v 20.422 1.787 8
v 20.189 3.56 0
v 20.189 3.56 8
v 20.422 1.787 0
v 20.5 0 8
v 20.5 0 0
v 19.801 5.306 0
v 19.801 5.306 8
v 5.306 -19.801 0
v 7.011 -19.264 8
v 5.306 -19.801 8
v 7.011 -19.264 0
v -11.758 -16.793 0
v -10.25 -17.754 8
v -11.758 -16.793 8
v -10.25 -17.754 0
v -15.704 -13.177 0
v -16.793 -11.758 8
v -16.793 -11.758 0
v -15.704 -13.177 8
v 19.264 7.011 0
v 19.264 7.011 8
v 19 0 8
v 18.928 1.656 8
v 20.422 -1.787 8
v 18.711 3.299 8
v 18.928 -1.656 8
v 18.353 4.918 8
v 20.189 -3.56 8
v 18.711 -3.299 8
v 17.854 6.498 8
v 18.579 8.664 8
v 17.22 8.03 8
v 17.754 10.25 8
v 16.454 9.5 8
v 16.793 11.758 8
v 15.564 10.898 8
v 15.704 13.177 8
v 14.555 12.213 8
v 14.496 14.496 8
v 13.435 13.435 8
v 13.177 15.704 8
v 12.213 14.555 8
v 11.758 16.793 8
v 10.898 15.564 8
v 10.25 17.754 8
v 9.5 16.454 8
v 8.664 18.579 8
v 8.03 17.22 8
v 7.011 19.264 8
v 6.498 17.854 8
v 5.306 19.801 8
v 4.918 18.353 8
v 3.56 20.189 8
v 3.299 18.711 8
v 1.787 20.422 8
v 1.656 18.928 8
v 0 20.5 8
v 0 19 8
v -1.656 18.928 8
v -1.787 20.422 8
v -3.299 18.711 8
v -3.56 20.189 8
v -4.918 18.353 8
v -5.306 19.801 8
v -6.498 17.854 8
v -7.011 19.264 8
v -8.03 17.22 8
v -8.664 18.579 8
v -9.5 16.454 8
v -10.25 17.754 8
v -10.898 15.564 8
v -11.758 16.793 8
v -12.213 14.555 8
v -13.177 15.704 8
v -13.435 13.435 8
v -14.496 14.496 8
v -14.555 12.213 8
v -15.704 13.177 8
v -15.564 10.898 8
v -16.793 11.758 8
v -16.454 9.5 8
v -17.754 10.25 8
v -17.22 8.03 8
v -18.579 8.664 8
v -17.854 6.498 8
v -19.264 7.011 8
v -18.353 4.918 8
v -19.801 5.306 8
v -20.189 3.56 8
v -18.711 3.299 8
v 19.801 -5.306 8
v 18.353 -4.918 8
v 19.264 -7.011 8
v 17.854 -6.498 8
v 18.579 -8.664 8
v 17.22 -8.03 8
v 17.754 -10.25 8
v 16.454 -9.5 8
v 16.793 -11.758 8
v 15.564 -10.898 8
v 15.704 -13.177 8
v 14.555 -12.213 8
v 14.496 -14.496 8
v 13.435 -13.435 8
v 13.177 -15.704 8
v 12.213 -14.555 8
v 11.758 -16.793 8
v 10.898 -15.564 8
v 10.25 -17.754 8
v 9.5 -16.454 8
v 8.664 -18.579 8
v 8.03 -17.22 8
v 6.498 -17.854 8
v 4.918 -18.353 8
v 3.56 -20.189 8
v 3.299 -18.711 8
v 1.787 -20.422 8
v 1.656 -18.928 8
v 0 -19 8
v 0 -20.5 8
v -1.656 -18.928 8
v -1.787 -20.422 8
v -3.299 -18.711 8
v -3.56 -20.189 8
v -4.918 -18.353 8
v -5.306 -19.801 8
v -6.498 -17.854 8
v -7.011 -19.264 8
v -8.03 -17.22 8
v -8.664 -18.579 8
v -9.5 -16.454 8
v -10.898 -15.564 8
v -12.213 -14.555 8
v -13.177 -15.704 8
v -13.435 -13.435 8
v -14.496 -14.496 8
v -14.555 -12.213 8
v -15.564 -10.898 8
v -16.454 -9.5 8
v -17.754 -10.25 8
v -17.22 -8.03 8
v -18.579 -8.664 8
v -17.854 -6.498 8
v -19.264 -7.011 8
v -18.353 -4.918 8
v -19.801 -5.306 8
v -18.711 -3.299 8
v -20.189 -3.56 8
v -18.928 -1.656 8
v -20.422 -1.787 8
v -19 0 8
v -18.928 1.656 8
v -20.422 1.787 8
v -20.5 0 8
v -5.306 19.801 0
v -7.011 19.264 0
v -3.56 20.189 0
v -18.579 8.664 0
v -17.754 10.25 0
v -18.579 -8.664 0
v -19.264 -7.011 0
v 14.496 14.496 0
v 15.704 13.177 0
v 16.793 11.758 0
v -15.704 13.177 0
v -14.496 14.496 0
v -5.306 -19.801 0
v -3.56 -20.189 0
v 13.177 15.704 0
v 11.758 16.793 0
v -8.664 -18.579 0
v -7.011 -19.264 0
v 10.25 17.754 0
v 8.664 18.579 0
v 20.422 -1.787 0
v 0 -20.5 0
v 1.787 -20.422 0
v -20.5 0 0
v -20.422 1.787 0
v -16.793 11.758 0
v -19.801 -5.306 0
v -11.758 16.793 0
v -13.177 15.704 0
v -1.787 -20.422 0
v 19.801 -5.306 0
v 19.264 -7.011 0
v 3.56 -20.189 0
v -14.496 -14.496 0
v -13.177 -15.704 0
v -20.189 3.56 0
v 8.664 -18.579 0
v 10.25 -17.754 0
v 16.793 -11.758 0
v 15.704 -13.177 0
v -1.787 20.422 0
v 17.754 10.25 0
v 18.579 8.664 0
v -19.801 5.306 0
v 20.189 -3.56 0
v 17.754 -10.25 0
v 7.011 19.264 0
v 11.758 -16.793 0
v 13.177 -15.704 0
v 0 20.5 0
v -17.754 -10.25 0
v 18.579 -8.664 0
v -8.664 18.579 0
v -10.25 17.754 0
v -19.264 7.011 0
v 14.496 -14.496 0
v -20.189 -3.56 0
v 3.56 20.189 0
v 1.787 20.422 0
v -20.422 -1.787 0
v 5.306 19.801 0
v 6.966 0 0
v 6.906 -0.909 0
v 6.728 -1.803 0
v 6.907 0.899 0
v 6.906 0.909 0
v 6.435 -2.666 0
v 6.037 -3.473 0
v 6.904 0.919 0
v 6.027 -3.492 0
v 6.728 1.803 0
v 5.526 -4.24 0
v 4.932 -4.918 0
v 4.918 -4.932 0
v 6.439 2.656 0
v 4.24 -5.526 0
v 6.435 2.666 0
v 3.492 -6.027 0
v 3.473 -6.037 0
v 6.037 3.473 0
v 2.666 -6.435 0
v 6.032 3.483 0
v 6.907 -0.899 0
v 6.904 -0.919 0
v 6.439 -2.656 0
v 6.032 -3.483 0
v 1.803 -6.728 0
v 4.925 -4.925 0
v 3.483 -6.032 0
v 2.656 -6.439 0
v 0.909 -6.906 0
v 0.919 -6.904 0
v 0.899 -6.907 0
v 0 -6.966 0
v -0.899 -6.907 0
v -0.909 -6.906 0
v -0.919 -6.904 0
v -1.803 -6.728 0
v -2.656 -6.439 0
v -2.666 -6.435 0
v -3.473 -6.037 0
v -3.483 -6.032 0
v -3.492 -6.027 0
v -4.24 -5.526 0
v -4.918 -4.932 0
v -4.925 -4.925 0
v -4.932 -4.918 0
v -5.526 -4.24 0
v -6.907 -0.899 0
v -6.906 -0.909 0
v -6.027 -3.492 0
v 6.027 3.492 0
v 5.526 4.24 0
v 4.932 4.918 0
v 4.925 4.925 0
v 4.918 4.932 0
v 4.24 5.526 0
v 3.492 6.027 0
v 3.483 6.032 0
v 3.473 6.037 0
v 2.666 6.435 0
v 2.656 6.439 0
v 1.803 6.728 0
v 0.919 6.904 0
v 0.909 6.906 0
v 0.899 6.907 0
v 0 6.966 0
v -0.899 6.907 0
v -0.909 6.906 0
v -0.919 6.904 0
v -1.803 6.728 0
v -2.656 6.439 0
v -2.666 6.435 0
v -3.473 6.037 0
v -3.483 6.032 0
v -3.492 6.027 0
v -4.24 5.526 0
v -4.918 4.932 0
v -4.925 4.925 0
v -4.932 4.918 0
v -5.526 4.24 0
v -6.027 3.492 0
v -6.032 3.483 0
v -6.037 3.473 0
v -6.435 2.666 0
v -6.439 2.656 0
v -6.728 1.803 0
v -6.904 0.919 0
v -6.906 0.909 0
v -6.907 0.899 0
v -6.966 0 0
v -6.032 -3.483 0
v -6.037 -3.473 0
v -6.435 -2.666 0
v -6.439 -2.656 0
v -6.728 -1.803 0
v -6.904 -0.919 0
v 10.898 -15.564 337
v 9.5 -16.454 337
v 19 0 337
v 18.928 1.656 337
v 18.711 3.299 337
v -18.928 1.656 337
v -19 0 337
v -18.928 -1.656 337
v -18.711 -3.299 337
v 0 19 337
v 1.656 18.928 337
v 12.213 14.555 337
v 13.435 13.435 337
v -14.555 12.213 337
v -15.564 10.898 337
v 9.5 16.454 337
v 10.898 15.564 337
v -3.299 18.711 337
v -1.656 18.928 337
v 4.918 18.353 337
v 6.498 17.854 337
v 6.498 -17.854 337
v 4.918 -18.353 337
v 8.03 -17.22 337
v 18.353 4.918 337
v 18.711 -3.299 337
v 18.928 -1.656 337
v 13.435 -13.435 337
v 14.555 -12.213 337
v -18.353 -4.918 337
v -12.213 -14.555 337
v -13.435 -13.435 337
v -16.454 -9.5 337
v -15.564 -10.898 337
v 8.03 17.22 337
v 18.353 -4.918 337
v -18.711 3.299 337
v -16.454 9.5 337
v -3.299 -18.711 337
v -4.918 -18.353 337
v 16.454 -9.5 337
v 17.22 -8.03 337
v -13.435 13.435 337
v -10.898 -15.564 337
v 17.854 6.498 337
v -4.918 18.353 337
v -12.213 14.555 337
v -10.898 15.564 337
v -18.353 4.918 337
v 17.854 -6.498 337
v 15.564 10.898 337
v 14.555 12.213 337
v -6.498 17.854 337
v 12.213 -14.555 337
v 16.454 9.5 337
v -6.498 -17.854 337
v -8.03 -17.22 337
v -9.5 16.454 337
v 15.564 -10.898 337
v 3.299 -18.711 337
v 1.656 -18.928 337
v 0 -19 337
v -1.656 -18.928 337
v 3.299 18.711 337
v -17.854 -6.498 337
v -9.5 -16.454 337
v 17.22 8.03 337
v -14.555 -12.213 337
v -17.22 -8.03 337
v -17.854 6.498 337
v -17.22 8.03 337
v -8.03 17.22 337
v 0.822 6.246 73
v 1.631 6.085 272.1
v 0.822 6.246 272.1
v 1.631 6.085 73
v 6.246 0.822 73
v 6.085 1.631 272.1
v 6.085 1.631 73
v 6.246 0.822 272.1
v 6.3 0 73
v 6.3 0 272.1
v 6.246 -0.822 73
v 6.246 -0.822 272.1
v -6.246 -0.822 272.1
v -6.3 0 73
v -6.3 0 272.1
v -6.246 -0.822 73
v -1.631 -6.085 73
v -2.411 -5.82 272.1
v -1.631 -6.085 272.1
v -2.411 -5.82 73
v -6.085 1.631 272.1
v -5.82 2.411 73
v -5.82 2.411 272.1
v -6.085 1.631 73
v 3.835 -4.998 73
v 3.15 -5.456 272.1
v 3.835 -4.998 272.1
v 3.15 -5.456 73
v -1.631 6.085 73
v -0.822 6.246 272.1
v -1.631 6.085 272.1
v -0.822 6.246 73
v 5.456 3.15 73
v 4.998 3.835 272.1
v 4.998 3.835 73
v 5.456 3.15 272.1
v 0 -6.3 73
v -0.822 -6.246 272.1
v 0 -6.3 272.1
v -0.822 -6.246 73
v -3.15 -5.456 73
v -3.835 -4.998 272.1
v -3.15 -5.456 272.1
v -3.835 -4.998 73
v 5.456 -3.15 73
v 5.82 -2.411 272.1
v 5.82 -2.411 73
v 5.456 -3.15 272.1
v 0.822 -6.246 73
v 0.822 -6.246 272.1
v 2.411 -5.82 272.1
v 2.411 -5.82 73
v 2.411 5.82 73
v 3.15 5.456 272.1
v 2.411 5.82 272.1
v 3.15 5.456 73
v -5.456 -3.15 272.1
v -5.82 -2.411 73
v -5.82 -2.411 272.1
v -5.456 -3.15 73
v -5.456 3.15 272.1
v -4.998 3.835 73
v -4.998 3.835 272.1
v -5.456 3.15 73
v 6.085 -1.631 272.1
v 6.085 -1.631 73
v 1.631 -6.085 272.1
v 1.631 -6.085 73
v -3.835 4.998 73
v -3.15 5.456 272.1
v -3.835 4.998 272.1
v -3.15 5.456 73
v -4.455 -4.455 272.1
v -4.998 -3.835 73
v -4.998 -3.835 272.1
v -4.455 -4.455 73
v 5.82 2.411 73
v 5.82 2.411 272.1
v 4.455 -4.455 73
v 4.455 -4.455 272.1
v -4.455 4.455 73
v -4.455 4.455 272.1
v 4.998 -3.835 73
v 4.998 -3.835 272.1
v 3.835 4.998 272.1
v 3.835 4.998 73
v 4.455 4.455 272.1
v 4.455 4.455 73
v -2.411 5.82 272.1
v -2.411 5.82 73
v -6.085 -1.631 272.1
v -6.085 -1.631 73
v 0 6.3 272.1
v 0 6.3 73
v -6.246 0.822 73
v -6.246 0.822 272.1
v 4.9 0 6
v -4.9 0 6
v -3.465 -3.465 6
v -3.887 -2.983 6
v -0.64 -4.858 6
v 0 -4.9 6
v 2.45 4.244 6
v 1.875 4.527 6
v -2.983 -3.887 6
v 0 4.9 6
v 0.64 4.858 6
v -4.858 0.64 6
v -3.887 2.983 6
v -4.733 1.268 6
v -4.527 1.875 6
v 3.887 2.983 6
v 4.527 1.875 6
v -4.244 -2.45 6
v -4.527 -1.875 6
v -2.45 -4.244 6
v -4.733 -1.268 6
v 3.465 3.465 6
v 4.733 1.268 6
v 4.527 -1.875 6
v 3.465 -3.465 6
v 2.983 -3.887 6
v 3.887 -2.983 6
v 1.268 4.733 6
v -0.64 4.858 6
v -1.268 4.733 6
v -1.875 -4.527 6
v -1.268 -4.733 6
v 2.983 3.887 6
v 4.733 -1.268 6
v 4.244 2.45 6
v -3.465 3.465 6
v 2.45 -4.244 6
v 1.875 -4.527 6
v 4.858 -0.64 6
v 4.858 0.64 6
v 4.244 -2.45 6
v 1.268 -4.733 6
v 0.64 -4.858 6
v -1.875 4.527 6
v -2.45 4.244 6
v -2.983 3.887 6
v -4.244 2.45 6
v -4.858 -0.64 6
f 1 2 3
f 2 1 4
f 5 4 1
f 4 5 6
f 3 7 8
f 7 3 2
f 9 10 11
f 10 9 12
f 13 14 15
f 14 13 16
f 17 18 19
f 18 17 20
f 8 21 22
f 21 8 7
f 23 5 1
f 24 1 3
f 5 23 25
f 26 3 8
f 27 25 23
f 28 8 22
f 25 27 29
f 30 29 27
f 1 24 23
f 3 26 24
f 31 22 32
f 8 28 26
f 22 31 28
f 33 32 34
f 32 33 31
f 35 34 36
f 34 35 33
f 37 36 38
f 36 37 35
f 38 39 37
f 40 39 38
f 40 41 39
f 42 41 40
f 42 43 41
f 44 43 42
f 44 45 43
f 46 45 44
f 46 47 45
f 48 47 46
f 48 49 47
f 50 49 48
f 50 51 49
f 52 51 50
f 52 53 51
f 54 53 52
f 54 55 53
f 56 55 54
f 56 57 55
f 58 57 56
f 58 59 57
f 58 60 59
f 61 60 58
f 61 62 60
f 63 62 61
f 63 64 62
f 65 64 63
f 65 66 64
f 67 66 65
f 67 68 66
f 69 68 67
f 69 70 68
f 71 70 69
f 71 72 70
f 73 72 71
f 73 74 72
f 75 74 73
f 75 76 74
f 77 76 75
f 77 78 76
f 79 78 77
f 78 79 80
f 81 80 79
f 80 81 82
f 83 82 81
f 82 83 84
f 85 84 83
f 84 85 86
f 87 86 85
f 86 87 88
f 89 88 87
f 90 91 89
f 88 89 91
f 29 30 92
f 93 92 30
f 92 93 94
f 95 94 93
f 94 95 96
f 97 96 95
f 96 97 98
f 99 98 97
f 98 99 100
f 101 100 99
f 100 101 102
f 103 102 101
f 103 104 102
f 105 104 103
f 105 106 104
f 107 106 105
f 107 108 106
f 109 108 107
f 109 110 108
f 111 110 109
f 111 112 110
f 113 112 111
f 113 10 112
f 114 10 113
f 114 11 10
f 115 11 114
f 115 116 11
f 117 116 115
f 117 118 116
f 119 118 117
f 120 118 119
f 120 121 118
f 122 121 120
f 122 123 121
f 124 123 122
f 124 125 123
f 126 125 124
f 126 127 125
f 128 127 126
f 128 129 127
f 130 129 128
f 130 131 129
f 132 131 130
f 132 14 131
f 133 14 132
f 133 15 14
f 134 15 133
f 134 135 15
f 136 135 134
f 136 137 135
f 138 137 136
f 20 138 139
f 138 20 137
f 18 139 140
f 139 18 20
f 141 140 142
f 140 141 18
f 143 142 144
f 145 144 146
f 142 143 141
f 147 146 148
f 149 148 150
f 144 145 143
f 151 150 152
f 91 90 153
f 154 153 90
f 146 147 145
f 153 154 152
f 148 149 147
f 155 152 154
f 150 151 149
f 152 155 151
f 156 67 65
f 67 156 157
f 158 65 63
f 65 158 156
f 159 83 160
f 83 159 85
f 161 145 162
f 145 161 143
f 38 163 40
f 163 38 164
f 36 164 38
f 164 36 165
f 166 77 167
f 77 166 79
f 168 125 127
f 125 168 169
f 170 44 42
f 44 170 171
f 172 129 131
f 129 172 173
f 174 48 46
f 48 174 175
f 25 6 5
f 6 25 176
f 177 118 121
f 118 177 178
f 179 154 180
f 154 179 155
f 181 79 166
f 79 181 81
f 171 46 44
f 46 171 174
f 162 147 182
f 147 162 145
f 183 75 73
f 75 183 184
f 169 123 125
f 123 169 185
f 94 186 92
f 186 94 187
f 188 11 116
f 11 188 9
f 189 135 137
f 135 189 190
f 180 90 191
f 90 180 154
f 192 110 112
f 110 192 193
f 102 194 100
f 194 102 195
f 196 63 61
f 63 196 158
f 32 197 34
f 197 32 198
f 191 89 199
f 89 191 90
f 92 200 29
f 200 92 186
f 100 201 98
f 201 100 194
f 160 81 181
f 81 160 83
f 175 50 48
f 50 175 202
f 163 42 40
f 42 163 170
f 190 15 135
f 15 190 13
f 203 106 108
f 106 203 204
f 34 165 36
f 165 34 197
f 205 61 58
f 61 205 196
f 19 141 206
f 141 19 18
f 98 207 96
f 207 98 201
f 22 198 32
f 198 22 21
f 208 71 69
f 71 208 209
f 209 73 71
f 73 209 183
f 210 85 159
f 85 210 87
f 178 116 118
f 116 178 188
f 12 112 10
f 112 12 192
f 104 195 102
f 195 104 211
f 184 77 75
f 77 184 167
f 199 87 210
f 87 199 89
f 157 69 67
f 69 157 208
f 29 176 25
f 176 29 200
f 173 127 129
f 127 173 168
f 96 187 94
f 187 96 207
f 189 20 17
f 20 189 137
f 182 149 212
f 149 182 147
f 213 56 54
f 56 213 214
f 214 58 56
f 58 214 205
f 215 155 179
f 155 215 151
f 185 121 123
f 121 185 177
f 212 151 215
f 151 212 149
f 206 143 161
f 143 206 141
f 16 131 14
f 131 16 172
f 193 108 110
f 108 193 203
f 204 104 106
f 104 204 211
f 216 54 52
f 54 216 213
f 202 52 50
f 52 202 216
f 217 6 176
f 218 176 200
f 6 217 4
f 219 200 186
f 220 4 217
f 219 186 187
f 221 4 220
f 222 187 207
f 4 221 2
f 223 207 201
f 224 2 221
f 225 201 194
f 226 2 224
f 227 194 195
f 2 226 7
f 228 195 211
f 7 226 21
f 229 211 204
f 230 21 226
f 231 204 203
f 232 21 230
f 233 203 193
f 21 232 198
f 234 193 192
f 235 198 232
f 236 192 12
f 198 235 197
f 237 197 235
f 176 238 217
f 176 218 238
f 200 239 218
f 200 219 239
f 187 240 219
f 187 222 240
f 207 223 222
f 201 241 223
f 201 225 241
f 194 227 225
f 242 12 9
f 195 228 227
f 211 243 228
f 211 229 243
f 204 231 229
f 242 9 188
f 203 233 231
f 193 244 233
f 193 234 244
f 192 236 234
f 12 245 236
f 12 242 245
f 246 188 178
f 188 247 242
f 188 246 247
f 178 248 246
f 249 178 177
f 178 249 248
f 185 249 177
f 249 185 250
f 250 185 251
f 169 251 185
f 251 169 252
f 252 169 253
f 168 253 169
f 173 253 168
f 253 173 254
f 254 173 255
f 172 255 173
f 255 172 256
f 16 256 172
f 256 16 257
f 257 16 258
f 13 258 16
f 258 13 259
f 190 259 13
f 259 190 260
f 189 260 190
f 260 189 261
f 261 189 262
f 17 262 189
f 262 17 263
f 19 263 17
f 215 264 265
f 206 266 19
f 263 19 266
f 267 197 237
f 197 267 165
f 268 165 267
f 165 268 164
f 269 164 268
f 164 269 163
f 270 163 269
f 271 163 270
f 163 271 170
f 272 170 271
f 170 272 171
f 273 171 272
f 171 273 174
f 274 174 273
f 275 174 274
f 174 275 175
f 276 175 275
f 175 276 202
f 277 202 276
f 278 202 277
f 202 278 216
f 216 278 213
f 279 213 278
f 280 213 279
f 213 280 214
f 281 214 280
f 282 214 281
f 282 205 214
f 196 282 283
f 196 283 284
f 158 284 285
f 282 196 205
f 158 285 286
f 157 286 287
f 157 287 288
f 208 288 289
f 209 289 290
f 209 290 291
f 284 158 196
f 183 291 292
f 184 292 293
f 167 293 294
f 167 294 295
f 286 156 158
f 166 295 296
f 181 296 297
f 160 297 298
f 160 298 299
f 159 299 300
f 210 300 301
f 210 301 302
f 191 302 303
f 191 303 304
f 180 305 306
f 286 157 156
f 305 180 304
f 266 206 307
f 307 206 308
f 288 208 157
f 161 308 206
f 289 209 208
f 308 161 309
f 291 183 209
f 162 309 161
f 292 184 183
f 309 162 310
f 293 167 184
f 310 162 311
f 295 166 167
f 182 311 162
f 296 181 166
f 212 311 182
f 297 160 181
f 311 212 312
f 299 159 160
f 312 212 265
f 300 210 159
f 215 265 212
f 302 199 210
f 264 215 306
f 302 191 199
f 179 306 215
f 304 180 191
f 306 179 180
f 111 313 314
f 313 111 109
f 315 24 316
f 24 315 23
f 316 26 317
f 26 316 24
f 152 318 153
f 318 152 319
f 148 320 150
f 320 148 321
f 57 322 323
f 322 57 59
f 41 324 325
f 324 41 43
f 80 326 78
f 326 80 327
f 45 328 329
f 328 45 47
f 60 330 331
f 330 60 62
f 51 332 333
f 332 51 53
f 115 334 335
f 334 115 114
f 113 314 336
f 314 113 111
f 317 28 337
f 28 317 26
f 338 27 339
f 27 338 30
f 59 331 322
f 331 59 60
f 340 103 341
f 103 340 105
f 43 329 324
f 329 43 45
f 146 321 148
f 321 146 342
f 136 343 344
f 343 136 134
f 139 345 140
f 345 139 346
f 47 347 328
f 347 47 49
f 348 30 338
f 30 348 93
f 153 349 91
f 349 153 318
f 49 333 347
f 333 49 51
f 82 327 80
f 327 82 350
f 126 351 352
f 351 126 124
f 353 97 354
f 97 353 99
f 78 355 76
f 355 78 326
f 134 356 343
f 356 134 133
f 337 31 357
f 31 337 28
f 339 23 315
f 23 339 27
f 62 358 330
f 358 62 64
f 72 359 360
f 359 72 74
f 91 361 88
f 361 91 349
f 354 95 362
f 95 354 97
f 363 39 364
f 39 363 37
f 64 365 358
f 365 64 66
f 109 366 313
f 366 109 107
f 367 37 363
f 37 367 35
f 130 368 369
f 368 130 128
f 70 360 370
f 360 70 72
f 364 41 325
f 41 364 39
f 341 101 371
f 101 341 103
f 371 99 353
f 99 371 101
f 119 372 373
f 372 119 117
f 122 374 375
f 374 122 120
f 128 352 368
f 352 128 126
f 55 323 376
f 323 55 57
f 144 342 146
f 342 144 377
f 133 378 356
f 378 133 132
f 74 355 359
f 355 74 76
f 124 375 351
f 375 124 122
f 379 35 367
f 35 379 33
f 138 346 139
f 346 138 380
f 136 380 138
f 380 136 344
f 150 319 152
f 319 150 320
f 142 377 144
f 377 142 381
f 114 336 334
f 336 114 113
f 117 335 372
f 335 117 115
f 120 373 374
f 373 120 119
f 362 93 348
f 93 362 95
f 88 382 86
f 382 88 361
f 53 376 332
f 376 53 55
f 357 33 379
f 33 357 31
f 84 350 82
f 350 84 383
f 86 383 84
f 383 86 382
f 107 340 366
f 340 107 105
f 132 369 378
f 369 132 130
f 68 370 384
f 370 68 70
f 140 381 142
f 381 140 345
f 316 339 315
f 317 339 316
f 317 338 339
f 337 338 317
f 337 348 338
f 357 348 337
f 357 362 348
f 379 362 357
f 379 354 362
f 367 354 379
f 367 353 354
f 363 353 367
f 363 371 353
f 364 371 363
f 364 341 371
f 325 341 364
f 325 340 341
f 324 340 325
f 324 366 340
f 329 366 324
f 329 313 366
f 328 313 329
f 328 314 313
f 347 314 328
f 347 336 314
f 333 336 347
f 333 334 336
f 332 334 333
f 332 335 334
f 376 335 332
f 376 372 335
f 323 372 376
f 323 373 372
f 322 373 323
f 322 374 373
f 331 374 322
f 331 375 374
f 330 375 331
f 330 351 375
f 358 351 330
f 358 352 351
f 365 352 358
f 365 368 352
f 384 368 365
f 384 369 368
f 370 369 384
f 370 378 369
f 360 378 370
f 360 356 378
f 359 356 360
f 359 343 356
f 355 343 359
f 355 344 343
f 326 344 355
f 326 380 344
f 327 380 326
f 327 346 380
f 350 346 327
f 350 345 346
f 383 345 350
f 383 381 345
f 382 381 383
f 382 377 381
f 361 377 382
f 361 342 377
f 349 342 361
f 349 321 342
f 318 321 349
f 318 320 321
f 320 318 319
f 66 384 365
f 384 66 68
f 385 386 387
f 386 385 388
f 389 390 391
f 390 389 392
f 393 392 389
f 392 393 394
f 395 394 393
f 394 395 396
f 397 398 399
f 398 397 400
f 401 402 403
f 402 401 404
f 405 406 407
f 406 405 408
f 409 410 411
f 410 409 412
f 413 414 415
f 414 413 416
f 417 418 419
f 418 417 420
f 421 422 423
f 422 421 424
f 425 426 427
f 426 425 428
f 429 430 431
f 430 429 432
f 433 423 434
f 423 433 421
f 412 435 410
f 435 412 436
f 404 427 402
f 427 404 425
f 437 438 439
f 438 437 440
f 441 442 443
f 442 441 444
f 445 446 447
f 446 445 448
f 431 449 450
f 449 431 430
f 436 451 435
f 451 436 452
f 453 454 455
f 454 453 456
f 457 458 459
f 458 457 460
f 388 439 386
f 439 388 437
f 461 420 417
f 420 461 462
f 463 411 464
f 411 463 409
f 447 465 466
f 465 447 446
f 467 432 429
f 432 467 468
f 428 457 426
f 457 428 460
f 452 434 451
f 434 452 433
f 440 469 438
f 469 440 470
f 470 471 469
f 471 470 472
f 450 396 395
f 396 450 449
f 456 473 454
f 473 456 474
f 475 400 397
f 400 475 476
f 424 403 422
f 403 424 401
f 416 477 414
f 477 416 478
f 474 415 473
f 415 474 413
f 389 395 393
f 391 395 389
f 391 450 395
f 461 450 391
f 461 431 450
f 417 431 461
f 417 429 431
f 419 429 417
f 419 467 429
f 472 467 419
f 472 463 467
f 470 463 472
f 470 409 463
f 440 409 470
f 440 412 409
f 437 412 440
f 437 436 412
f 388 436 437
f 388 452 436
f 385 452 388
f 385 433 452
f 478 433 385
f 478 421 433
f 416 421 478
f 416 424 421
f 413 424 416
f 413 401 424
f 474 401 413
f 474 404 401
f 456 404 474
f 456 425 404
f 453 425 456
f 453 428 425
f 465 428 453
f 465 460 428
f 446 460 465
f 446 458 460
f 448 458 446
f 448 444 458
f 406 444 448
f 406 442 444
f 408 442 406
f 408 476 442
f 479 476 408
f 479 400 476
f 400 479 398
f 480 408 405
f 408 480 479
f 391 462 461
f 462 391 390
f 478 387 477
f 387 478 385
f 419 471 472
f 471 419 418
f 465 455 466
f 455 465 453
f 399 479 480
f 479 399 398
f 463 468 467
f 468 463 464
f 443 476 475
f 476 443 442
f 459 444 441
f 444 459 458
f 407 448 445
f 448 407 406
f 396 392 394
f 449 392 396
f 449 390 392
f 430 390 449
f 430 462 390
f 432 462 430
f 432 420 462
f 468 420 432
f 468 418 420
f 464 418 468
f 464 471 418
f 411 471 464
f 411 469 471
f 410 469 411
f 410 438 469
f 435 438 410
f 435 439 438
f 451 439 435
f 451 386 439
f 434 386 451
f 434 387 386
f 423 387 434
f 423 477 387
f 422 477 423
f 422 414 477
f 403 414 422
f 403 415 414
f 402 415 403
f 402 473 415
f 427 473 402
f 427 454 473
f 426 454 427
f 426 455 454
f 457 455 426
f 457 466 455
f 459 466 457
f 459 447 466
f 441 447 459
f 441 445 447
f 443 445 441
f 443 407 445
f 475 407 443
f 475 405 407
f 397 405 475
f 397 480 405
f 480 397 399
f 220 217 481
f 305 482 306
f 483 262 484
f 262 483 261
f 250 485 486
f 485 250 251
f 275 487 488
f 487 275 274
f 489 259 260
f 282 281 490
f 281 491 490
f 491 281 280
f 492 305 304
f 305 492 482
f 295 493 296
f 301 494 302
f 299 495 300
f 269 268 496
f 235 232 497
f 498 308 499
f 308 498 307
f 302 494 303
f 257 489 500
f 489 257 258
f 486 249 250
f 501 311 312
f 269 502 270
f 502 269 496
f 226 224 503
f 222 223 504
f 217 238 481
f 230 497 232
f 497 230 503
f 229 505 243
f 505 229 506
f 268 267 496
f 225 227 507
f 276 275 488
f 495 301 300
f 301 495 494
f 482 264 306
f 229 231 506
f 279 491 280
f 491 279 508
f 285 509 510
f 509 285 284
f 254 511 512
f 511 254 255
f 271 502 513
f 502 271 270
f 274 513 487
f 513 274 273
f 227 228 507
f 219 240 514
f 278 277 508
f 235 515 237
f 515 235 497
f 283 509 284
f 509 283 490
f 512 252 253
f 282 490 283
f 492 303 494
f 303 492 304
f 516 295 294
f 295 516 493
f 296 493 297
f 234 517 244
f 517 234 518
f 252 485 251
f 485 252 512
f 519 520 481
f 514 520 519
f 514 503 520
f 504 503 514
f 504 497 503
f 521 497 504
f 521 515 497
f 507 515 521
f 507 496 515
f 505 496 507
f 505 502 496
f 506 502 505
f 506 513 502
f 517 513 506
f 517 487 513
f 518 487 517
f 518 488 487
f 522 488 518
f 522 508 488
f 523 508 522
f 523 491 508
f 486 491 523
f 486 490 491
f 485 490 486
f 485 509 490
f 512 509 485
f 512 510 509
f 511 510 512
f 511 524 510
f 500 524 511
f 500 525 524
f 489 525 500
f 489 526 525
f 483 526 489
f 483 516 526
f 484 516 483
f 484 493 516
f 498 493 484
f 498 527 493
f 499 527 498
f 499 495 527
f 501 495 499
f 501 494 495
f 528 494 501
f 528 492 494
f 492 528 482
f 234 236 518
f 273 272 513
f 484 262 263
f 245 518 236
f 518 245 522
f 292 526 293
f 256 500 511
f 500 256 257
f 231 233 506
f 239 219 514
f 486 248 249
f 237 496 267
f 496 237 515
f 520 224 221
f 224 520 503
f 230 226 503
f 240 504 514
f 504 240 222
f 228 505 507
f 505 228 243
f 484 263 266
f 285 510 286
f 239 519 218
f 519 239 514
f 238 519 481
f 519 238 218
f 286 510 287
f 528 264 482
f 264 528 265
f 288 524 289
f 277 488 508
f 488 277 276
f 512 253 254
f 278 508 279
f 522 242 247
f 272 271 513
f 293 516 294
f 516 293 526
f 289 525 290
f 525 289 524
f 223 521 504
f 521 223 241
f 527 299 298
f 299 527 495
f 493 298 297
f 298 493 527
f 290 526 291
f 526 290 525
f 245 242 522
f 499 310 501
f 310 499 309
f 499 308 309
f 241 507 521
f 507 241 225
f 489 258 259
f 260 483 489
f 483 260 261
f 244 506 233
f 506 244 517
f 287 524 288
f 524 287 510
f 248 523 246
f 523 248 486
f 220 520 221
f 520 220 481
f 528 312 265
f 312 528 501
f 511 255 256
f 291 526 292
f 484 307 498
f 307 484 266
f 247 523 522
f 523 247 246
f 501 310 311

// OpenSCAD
// Aerotech J420R-14A Motor Mass Equivalent Model
// Solid PLA with steel rod cavity and retainer shoulder

// === MOTOR SPECIFICATIONS ===
motor_diameter = 38;      // mm
motor_length = 337;       // mm
motor_mass = 650;         // grams

// === AFT CLOSURE SHOULDER ===
shoulder_diameter = 41;   // mm (38mm RMS aft closure)
shoulder_thickness = 8;   // mm

// === MATERIAL DENSITIES ===
pla_density = 1.24;       // g/cm³
steel_density = 7.85;     // g/cm³

// === STEEL ROD PARAMETERS ===
rod_diameter = 12;        // mm (12mm rod recommended)
rod_clearance = 0.3;      // mm

// === CALCULATIONS ===
motor_radius = motor_diameter / 2;
shoulder_radius = shoulder_diameter / 2;
rod_radius = rod_diameter / 2;
cavity_radius = rod_radius + rod_clearance;

// Body length (excluding shoulder)
body_length = motor_length - shoulder_thickness;

// Volumes (cm³)
body_volume_mm3 = PI * pow(motor_radius, 2) * body_length;
shoulder_volume_mm3 = PI * pow(shoulder_radius, 2) * shoulder_thickness;
solid_volume_cm3 = (body_volume_mm3 + shoulder_volume_mm3) / 1000;

pla_mass_if_solid = solid_volume_cm3 * pla_density;
mass_deficit = motor_mass - pla_mass_if_solid;

// Required steel rod
steel_volume_needed_cm3 = mass_deficit / steel_density;
rod_length_needed = (steel_volume_needed_cm3 * 1000) / (PI * pow(rod_radius, 2));

// Cavity positioning (centered in body, avoiding shoulder)
cavity_length = ceil(rod_length_needed) + 2;
cavity_offset = shoulder_thickness + (body_length - cavity_length) / 2;

// Final mass calculation
cavity_volume_cm3 = (PI * pow(cavity_radius, 2) * cavity_length) / 1000;
pla_volume_cm3 = solid_volume_cm3 - cavity_volume_cm3;
pla_mass = pla_volume_cm3 * pla_density;
rod_volume_cm3 = (PI * pow(rod_radius, 2) * rod_length_needed) / 1000;
rod_mass = rod_volume_cm3 * steel_density;
total_mass = pla_mass + rod_mass;

// === CONSOLE OUTPUT ===
echo("========================================");
echo("  AEROTECH J420R-14A MASS EQUIVALENT");
echo("========================================");
echo(str("Target mass: ", motor_mass, " g"));
echo(str("Body length: ", body_length, " mm"));
echo(str("Shoulder: ", shoulder_diameter, "mm x ", shoulder_thickness, "mm"));
echo("----------------------------------------");
echo(str("Steel rod: ", rod_diameter, "mm x ", rod_length_needed, "mm"));
echo(str("Cut rod to: ", ceil(rod_length_needed), " mm"));
echo("----------------------------------------");
echo(str("PLA mass: ", pla_mass, " g"));
echo(str("Steel mass: ", rod_mass, " g"));
echo(str("TOTAL MASS: ", total_mass, " g"));
echo(str("Target: ", motor_mass, " g (error: ", total_mass - motor_mass, " g)"));
echo("========================================");
echo("");
echo("NOTE: 337mm exceeds most print beds.");
echo("Suggested cut point: ~160mm from aft end");
echo("(keeps rod cavity in one piece)");

// === NOZZLE COSMETIC DETAIL ===
nozzle_exit_diameter = 14;
nozzle_depth = 6;

// === MODEL ===
module motor_with_shoulder() {
    difference() {
        union() {
            // Aft shoulder (at z=0, this is the aft/nozzle end)
            cylinder(h = shoulder_thickness, r = shoulder_radius, $fn = 72);
            
            // Main body
            translate([0, 0, shoulder_thickness])
                cylinder(h = body_length, r = motor_radius, $fn = 72);
        }
        
        // Rod cavity
        translate([0, 0, cavity_offset])
            cylinder(h = cavity_length + 0.1, r = cavity_radius, $fn = 48);
        
        // Nozzle detail (aft end)
        translate([0, 0, -0.1])
            cylinder(h = nozzle_depth + 0.1, 
                    r1 = nozzle_exit_diameter/2, 
                    r2 = nozzle_exit_diameter * 0.35, 
                    $fn = 48);
    }
}

motor_with_shoulder();
